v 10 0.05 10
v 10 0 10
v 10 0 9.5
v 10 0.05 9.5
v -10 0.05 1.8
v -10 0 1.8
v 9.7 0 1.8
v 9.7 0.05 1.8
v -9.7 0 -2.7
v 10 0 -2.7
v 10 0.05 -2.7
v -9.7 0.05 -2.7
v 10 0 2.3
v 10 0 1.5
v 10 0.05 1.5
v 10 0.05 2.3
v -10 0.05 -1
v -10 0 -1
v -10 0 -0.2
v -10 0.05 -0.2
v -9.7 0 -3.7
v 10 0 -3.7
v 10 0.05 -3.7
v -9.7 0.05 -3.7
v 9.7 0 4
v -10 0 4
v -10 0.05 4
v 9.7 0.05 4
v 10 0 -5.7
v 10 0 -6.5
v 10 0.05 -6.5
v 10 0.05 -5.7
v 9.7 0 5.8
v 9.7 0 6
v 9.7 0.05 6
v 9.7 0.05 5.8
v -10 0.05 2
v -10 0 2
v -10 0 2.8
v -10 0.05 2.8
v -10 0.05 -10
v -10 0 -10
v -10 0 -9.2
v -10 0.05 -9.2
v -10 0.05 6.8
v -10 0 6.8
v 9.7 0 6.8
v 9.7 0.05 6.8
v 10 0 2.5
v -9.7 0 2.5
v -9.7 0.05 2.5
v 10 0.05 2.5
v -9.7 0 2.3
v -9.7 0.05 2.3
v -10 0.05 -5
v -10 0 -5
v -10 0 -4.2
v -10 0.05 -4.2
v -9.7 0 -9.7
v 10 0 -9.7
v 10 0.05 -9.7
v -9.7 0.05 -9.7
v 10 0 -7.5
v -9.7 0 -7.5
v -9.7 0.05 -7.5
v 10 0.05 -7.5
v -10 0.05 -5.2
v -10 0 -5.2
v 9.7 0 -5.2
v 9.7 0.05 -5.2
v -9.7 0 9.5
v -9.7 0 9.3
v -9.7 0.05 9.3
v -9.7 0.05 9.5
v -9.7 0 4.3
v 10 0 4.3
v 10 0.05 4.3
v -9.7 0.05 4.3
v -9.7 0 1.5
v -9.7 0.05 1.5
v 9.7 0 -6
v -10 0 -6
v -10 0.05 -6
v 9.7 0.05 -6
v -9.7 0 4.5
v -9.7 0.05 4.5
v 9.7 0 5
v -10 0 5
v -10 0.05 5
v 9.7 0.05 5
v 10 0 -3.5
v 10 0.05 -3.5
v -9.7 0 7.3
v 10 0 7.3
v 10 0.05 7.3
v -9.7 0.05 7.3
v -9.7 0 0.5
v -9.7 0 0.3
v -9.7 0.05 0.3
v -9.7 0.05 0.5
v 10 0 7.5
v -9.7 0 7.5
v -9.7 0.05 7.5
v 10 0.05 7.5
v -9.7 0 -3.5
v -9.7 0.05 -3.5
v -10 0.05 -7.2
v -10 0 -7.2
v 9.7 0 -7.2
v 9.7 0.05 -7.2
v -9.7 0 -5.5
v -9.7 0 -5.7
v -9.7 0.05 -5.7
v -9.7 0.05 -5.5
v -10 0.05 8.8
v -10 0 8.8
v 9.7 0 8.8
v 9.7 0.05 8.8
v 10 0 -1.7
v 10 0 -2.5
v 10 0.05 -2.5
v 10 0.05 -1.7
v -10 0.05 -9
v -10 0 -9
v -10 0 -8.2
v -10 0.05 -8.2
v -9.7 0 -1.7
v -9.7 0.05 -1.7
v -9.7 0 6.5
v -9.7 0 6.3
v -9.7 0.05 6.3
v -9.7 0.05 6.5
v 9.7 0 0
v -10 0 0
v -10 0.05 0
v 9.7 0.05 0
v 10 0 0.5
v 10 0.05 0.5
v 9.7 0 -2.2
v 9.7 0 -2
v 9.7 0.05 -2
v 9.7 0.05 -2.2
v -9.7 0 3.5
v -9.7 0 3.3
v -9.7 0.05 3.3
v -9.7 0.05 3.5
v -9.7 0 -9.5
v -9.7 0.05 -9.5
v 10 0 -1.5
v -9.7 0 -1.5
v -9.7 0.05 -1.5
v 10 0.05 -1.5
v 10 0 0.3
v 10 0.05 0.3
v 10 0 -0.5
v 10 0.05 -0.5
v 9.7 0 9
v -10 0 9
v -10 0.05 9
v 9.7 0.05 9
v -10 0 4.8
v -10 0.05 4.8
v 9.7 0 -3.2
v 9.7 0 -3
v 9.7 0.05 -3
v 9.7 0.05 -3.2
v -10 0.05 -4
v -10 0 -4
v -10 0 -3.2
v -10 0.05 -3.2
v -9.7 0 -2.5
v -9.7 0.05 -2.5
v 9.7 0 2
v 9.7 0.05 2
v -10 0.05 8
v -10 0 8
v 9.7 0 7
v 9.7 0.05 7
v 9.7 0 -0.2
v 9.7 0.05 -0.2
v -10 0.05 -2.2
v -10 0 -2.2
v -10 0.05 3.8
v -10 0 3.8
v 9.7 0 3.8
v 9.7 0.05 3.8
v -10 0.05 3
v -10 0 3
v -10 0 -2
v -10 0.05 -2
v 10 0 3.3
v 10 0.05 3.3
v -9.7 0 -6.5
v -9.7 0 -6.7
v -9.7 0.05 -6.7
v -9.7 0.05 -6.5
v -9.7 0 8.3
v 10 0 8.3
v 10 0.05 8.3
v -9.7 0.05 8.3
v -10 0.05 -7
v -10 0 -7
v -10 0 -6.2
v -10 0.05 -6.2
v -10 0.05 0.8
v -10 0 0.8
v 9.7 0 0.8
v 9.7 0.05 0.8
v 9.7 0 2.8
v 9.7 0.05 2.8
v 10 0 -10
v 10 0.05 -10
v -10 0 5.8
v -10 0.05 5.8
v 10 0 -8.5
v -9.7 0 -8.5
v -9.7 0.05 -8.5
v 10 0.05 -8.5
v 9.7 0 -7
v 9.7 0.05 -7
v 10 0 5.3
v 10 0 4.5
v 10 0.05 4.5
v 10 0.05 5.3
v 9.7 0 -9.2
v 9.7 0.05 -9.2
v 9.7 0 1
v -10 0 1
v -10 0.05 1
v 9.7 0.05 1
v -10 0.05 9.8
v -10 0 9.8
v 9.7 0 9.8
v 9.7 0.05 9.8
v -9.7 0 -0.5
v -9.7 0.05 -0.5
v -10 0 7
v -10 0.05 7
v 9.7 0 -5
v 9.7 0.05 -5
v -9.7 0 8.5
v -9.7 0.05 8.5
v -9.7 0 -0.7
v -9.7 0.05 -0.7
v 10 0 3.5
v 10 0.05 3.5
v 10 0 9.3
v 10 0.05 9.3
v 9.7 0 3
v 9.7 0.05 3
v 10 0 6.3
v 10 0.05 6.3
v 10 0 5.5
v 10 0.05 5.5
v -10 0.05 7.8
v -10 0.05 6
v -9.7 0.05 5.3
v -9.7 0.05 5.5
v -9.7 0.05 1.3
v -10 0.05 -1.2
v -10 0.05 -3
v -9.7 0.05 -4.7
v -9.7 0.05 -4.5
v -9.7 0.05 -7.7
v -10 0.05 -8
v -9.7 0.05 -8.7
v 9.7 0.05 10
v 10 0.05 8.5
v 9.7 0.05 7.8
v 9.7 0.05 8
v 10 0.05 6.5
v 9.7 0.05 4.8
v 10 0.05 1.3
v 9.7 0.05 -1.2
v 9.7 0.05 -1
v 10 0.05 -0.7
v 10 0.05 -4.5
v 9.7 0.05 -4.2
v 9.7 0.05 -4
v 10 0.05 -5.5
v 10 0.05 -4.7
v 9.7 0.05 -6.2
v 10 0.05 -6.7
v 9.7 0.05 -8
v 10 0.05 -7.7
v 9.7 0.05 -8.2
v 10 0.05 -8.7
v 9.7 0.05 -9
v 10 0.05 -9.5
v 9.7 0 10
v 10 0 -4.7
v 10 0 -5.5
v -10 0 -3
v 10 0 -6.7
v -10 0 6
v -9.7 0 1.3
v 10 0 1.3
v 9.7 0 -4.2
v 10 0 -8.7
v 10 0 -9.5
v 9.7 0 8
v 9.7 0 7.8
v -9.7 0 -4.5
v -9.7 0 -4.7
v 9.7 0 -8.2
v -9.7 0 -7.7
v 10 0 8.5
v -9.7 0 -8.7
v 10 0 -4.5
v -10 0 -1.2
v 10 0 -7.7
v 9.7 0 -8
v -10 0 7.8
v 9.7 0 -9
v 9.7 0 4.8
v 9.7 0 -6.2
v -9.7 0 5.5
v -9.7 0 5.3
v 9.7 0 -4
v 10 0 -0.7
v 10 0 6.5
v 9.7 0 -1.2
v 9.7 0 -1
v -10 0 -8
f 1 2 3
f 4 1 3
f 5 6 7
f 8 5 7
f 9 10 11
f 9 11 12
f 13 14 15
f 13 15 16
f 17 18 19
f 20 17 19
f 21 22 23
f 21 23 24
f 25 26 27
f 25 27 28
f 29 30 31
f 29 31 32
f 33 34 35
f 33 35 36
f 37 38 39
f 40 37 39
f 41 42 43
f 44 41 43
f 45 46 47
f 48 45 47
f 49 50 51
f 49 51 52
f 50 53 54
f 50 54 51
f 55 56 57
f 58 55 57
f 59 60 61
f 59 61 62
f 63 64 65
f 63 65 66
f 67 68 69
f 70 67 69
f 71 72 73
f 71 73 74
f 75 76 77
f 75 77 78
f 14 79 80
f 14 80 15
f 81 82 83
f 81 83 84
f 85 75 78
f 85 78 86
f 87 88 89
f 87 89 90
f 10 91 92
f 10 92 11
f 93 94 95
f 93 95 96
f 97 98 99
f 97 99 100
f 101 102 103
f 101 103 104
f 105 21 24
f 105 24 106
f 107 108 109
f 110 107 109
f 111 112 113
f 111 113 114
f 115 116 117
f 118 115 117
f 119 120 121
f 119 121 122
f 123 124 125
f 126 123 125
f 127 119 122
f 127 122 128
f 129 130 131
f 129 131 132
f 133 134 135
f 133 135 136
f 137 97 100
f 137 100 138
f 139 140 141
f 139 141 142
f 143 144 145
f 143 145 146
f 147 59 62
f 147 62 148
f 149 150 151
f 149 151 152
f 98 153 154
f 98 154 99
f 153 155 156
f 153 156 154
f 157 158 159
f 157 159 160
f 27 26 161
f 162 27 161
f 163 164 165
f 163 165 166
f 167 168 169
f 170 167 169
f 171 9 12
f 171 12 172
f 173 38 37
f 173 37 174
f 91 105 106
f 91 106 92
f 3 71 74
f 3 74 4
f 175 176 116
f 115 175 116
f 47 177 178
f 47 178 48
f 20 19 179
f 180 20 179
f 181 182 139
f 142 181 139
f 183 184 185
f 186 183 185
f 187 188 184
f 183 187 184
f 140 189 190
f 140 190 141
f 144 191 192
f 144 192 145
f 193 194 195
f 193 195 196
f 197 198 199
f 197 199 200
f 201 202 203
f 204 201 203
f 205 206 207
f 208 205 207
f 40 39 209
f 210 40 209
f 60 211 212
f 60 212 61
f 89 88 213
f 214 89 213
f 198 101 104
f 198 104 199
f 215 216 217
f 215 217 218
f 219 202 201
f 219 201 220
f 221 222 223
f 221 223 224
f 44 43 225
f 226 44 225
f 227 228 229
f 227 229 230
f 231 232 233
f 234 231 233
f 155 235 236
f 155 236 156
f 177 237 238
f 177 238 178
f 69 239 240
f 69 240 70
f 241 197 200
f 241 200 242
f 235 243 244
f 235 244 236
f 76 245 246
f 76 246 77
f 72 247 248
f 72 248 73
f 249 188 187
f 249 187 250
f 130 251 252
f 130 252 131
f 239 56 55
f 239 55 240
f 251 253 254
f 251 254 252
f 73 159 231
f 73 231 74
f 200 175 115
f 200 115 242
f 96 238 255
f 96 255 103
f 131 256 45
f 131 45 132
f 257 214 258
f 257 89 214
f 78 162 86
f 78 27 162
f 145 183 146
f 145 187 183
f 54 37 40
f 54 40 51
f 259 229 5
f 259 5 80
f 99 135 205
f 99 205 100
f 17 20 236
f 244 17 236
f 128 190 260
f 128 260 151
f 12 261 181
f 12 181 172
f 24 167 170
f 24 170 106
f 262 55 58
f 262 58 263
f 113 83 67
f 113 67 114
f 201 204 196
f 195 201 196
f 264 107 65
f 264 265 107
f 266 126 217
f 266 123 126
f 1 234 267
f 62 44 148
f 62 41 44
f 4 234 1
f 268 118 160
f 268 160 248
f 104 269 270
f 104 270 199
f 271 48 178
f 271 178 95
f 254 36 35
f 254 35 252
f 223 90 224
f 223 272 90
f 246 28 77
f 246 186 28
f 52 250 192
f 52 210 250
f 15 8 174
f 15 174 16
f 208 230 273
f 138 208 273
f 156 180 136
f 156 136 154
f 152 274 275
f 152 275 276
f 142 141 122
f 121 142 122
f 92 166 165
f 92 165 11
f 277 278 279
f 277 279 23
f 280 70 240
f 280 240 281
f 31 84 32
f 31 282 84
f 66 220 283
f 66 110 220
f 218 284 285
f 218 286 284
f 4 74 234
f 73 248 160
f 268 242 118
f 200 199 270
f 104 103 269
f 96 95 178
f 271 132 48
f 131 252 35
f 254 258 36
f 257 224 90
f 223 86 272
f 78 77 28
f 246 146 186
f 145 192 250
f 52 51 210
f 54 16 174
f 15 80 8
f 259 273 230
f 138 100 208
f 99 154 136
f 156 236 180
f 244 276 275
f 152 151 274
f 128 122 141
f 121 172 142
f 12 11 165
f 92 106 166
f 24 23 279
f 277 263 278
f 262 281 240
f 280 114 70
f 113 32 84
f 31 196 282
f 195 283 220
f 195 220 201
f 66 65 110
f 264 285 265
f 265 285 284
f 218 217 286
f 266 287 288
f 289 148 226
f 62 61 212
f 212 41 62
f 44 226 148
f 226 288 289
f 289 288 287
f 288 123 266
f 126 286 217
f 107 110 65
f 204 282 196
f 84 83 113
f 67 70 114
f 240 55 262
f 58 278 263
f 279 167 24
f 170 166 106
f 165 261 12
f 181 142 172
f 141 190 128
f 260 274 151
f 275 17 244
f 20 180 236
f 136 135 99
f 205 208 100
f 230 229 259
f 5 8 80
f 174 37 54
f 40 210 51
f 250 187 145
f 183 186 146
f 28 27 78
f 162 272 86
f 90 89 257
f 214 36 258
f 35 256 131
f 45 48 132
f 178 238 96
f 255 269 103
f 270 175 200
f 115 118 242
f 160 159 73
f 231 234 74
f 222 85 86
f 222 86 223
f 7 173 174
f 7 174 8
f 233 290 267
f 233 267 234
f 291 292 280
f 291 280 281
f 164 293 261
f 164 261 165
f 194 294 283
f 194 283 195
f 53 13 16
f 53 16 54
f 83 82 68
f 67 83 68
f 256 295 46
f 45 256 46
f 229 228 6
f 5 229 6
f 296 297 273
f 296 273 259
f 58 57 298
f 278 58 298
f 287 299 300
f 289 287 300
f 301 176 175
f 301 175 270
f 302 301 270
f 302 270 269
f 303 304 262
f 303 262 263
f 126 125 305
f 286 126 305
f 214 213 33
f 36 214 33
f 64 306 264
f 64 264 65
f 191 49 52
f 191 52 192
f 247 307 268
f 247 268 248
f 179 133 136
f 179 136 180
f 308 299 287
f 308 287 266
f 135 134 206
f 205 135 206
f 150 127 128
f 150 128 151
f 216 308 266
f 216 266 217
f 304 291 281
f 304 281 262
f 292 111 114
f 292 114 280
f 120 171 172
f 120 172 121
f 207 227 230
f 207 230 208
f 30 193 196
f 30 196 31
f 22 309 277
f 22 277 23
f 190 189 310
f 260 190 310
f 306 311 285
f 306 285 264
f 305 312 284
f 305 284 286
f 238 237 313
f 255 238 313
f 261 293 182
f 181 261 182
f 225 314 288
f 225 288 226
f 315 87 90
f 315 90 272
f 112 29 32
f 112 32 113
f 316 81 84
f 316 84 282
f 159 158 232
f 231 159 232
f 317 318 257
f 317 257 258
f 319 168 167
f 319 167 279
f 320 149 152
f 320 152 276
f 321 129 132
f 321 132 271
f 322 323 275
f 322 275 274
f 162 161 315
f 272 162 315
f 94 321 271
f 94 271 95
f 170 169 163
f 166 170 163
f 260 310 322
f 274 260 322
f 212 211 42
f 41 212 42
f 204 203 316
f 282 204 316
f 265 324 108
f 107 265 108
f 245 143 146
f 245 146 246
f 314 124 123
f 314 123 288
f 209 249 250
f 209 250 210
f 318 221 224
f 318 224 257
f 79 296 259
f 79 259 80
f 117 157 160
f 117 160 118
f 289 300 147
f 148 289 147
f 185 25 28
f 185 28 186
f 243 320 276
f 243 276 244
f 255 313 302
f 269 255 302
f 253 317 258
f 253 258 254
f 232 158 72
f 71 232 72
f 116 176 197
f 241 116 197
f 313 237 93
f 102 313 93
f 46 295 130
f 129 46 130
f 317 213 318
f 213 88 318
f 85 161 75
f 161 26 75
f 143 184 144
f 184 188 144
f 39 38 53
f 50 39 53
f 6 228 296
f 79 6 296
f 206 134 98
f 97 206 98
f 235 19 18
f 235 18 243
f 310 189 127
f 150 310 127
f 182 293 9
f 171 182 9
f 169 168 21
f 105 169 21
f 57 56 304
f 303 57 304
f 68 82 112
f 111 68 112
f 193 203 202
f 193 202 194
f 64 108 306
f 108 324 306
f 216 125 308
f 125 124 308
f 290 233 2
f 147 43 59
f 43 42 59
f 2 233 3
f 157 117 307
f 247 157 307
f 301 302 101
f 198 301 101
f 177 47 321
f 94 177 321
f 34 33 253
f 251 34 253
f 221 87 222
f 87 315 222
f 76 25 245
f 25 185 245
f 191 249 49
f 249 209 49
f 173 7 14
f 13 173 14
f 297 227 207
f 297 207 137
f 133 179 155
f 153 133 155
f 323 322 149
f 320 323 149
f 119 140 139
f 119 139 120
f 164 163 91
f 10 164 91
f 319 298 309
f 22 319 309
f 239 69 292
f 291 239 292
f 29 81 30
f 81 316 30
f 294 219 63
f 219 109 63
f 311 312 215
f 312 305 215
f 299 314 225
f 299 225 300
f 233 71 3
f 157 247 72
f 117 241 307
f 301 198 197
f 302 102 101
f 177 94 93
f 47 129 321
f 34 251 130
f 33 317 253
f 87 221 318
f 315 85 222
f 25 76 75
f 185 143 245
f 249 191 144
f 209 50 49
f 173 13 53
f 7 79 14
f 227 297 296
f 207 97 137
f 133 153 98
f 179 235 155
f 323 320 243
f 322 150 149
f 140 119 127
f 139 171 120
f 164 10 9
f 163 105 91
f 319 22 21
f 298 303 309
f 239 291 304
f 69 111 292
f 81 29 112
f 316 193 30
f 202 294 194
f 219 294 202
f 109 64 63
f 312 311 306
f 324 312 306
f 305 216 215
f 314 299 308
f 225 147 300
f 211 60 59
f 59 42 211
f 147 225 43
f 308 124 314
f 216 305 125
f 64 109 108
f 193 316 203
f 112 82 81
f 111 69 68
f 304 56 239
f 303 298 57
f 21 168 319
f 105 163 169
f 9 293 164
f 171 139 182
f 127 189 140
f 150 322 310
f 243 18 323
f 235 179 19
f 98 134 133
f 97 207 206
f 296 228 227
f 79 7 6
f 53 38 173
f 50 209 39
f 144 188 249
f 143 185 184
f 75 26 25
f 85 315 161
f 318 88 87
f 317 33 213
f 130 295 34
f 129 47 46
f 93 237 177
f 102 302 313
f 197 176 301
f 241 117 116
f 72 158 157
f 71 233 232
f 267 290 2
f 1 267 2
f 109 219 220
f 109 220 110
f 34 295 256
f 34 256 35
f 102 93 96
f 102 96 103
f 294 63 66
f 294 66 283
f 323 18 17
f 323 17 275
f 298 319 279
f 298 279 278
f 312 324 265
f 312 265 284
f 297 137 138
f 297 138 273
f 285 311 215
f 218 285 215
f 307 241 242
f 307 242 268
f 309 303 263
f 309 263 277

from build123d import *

# Parameters (mm, degrees)
EXTRUDED_OBJECT_DEPTH = 0.05
BOSS_EXTRUDE2_DEPTH   = 0.05
LPATTERN1_COUNT       = 19
LPATTERN1_PITCH       = 1
SKETCH1_W             = 0.3
SKETCH1_H             = 0.2
BOSS_EXTRUDE3_DEPTH   = 0.05


with BuildPart() as part:
    # TopBlock → Extruded object (new body)
    with BuildSketch(Plane(origin=(0, 0, 0), x_dir=(1, 0, 0), z_dir=(0, 1, 0))):
        Polygon((-10, 10), (-9.7, 10), (10, 10), (10, 9.7), (-9.7, 9.7), (-9.7, 9.5), (9.7, 9.5), (10, 9.5), (10, 9.2), (9.7, 9.2), (-9.7, 9.2), (-10, 9.2), (-10, 9.5), (-10, 9.7), align=None)
    extrude(amount=EXTRUDED_OBJECT_DEPTH)

    # GapandInbetween → Boss-Extrude2 (add)
    with BuildSketch(Plane(origin=(0, 0, 0), x_dir=(1, 0, 0), z_dir=(0, 1, 0))):
        Polygon((10, 9.2), (10, 9), (10, 8.7), (-9.7, 8.7), (-9.7, 8.5), (10, 8.5), (10, 8.2), (9.7, 8.2), (-10, 8.2), (-10, 8.5), (-10, 8.7), (-10, 9), (9.7, 9), (9.7, 9.2), align=None)
    boss_extrude2 = extrude(amount=BOSS_EXTRUDE2_DEPTH)

    # LPattern1: Boss-Extrude2 ×19
    with Locations(*[(0, 0, i * LPATTERN1_PITCH) for i in range(1, LPATTERN1_COUNT)]):
        add(boss_extrude2)

    # Sketch1 → Boss-Extrude3 (add)
    with BuildSketch(Plane(origin=(0, 0, 0), x_dir=(1, 0, 0), z_dir=(0, 1, 0))):
        with Locations((9.85, -9.9)):
            Rectangle(SKETCH1_W, SKETCH1_H)
    extrude(amount=BOSS_EXTRUDE3_DEPTH)


solid = part.part
